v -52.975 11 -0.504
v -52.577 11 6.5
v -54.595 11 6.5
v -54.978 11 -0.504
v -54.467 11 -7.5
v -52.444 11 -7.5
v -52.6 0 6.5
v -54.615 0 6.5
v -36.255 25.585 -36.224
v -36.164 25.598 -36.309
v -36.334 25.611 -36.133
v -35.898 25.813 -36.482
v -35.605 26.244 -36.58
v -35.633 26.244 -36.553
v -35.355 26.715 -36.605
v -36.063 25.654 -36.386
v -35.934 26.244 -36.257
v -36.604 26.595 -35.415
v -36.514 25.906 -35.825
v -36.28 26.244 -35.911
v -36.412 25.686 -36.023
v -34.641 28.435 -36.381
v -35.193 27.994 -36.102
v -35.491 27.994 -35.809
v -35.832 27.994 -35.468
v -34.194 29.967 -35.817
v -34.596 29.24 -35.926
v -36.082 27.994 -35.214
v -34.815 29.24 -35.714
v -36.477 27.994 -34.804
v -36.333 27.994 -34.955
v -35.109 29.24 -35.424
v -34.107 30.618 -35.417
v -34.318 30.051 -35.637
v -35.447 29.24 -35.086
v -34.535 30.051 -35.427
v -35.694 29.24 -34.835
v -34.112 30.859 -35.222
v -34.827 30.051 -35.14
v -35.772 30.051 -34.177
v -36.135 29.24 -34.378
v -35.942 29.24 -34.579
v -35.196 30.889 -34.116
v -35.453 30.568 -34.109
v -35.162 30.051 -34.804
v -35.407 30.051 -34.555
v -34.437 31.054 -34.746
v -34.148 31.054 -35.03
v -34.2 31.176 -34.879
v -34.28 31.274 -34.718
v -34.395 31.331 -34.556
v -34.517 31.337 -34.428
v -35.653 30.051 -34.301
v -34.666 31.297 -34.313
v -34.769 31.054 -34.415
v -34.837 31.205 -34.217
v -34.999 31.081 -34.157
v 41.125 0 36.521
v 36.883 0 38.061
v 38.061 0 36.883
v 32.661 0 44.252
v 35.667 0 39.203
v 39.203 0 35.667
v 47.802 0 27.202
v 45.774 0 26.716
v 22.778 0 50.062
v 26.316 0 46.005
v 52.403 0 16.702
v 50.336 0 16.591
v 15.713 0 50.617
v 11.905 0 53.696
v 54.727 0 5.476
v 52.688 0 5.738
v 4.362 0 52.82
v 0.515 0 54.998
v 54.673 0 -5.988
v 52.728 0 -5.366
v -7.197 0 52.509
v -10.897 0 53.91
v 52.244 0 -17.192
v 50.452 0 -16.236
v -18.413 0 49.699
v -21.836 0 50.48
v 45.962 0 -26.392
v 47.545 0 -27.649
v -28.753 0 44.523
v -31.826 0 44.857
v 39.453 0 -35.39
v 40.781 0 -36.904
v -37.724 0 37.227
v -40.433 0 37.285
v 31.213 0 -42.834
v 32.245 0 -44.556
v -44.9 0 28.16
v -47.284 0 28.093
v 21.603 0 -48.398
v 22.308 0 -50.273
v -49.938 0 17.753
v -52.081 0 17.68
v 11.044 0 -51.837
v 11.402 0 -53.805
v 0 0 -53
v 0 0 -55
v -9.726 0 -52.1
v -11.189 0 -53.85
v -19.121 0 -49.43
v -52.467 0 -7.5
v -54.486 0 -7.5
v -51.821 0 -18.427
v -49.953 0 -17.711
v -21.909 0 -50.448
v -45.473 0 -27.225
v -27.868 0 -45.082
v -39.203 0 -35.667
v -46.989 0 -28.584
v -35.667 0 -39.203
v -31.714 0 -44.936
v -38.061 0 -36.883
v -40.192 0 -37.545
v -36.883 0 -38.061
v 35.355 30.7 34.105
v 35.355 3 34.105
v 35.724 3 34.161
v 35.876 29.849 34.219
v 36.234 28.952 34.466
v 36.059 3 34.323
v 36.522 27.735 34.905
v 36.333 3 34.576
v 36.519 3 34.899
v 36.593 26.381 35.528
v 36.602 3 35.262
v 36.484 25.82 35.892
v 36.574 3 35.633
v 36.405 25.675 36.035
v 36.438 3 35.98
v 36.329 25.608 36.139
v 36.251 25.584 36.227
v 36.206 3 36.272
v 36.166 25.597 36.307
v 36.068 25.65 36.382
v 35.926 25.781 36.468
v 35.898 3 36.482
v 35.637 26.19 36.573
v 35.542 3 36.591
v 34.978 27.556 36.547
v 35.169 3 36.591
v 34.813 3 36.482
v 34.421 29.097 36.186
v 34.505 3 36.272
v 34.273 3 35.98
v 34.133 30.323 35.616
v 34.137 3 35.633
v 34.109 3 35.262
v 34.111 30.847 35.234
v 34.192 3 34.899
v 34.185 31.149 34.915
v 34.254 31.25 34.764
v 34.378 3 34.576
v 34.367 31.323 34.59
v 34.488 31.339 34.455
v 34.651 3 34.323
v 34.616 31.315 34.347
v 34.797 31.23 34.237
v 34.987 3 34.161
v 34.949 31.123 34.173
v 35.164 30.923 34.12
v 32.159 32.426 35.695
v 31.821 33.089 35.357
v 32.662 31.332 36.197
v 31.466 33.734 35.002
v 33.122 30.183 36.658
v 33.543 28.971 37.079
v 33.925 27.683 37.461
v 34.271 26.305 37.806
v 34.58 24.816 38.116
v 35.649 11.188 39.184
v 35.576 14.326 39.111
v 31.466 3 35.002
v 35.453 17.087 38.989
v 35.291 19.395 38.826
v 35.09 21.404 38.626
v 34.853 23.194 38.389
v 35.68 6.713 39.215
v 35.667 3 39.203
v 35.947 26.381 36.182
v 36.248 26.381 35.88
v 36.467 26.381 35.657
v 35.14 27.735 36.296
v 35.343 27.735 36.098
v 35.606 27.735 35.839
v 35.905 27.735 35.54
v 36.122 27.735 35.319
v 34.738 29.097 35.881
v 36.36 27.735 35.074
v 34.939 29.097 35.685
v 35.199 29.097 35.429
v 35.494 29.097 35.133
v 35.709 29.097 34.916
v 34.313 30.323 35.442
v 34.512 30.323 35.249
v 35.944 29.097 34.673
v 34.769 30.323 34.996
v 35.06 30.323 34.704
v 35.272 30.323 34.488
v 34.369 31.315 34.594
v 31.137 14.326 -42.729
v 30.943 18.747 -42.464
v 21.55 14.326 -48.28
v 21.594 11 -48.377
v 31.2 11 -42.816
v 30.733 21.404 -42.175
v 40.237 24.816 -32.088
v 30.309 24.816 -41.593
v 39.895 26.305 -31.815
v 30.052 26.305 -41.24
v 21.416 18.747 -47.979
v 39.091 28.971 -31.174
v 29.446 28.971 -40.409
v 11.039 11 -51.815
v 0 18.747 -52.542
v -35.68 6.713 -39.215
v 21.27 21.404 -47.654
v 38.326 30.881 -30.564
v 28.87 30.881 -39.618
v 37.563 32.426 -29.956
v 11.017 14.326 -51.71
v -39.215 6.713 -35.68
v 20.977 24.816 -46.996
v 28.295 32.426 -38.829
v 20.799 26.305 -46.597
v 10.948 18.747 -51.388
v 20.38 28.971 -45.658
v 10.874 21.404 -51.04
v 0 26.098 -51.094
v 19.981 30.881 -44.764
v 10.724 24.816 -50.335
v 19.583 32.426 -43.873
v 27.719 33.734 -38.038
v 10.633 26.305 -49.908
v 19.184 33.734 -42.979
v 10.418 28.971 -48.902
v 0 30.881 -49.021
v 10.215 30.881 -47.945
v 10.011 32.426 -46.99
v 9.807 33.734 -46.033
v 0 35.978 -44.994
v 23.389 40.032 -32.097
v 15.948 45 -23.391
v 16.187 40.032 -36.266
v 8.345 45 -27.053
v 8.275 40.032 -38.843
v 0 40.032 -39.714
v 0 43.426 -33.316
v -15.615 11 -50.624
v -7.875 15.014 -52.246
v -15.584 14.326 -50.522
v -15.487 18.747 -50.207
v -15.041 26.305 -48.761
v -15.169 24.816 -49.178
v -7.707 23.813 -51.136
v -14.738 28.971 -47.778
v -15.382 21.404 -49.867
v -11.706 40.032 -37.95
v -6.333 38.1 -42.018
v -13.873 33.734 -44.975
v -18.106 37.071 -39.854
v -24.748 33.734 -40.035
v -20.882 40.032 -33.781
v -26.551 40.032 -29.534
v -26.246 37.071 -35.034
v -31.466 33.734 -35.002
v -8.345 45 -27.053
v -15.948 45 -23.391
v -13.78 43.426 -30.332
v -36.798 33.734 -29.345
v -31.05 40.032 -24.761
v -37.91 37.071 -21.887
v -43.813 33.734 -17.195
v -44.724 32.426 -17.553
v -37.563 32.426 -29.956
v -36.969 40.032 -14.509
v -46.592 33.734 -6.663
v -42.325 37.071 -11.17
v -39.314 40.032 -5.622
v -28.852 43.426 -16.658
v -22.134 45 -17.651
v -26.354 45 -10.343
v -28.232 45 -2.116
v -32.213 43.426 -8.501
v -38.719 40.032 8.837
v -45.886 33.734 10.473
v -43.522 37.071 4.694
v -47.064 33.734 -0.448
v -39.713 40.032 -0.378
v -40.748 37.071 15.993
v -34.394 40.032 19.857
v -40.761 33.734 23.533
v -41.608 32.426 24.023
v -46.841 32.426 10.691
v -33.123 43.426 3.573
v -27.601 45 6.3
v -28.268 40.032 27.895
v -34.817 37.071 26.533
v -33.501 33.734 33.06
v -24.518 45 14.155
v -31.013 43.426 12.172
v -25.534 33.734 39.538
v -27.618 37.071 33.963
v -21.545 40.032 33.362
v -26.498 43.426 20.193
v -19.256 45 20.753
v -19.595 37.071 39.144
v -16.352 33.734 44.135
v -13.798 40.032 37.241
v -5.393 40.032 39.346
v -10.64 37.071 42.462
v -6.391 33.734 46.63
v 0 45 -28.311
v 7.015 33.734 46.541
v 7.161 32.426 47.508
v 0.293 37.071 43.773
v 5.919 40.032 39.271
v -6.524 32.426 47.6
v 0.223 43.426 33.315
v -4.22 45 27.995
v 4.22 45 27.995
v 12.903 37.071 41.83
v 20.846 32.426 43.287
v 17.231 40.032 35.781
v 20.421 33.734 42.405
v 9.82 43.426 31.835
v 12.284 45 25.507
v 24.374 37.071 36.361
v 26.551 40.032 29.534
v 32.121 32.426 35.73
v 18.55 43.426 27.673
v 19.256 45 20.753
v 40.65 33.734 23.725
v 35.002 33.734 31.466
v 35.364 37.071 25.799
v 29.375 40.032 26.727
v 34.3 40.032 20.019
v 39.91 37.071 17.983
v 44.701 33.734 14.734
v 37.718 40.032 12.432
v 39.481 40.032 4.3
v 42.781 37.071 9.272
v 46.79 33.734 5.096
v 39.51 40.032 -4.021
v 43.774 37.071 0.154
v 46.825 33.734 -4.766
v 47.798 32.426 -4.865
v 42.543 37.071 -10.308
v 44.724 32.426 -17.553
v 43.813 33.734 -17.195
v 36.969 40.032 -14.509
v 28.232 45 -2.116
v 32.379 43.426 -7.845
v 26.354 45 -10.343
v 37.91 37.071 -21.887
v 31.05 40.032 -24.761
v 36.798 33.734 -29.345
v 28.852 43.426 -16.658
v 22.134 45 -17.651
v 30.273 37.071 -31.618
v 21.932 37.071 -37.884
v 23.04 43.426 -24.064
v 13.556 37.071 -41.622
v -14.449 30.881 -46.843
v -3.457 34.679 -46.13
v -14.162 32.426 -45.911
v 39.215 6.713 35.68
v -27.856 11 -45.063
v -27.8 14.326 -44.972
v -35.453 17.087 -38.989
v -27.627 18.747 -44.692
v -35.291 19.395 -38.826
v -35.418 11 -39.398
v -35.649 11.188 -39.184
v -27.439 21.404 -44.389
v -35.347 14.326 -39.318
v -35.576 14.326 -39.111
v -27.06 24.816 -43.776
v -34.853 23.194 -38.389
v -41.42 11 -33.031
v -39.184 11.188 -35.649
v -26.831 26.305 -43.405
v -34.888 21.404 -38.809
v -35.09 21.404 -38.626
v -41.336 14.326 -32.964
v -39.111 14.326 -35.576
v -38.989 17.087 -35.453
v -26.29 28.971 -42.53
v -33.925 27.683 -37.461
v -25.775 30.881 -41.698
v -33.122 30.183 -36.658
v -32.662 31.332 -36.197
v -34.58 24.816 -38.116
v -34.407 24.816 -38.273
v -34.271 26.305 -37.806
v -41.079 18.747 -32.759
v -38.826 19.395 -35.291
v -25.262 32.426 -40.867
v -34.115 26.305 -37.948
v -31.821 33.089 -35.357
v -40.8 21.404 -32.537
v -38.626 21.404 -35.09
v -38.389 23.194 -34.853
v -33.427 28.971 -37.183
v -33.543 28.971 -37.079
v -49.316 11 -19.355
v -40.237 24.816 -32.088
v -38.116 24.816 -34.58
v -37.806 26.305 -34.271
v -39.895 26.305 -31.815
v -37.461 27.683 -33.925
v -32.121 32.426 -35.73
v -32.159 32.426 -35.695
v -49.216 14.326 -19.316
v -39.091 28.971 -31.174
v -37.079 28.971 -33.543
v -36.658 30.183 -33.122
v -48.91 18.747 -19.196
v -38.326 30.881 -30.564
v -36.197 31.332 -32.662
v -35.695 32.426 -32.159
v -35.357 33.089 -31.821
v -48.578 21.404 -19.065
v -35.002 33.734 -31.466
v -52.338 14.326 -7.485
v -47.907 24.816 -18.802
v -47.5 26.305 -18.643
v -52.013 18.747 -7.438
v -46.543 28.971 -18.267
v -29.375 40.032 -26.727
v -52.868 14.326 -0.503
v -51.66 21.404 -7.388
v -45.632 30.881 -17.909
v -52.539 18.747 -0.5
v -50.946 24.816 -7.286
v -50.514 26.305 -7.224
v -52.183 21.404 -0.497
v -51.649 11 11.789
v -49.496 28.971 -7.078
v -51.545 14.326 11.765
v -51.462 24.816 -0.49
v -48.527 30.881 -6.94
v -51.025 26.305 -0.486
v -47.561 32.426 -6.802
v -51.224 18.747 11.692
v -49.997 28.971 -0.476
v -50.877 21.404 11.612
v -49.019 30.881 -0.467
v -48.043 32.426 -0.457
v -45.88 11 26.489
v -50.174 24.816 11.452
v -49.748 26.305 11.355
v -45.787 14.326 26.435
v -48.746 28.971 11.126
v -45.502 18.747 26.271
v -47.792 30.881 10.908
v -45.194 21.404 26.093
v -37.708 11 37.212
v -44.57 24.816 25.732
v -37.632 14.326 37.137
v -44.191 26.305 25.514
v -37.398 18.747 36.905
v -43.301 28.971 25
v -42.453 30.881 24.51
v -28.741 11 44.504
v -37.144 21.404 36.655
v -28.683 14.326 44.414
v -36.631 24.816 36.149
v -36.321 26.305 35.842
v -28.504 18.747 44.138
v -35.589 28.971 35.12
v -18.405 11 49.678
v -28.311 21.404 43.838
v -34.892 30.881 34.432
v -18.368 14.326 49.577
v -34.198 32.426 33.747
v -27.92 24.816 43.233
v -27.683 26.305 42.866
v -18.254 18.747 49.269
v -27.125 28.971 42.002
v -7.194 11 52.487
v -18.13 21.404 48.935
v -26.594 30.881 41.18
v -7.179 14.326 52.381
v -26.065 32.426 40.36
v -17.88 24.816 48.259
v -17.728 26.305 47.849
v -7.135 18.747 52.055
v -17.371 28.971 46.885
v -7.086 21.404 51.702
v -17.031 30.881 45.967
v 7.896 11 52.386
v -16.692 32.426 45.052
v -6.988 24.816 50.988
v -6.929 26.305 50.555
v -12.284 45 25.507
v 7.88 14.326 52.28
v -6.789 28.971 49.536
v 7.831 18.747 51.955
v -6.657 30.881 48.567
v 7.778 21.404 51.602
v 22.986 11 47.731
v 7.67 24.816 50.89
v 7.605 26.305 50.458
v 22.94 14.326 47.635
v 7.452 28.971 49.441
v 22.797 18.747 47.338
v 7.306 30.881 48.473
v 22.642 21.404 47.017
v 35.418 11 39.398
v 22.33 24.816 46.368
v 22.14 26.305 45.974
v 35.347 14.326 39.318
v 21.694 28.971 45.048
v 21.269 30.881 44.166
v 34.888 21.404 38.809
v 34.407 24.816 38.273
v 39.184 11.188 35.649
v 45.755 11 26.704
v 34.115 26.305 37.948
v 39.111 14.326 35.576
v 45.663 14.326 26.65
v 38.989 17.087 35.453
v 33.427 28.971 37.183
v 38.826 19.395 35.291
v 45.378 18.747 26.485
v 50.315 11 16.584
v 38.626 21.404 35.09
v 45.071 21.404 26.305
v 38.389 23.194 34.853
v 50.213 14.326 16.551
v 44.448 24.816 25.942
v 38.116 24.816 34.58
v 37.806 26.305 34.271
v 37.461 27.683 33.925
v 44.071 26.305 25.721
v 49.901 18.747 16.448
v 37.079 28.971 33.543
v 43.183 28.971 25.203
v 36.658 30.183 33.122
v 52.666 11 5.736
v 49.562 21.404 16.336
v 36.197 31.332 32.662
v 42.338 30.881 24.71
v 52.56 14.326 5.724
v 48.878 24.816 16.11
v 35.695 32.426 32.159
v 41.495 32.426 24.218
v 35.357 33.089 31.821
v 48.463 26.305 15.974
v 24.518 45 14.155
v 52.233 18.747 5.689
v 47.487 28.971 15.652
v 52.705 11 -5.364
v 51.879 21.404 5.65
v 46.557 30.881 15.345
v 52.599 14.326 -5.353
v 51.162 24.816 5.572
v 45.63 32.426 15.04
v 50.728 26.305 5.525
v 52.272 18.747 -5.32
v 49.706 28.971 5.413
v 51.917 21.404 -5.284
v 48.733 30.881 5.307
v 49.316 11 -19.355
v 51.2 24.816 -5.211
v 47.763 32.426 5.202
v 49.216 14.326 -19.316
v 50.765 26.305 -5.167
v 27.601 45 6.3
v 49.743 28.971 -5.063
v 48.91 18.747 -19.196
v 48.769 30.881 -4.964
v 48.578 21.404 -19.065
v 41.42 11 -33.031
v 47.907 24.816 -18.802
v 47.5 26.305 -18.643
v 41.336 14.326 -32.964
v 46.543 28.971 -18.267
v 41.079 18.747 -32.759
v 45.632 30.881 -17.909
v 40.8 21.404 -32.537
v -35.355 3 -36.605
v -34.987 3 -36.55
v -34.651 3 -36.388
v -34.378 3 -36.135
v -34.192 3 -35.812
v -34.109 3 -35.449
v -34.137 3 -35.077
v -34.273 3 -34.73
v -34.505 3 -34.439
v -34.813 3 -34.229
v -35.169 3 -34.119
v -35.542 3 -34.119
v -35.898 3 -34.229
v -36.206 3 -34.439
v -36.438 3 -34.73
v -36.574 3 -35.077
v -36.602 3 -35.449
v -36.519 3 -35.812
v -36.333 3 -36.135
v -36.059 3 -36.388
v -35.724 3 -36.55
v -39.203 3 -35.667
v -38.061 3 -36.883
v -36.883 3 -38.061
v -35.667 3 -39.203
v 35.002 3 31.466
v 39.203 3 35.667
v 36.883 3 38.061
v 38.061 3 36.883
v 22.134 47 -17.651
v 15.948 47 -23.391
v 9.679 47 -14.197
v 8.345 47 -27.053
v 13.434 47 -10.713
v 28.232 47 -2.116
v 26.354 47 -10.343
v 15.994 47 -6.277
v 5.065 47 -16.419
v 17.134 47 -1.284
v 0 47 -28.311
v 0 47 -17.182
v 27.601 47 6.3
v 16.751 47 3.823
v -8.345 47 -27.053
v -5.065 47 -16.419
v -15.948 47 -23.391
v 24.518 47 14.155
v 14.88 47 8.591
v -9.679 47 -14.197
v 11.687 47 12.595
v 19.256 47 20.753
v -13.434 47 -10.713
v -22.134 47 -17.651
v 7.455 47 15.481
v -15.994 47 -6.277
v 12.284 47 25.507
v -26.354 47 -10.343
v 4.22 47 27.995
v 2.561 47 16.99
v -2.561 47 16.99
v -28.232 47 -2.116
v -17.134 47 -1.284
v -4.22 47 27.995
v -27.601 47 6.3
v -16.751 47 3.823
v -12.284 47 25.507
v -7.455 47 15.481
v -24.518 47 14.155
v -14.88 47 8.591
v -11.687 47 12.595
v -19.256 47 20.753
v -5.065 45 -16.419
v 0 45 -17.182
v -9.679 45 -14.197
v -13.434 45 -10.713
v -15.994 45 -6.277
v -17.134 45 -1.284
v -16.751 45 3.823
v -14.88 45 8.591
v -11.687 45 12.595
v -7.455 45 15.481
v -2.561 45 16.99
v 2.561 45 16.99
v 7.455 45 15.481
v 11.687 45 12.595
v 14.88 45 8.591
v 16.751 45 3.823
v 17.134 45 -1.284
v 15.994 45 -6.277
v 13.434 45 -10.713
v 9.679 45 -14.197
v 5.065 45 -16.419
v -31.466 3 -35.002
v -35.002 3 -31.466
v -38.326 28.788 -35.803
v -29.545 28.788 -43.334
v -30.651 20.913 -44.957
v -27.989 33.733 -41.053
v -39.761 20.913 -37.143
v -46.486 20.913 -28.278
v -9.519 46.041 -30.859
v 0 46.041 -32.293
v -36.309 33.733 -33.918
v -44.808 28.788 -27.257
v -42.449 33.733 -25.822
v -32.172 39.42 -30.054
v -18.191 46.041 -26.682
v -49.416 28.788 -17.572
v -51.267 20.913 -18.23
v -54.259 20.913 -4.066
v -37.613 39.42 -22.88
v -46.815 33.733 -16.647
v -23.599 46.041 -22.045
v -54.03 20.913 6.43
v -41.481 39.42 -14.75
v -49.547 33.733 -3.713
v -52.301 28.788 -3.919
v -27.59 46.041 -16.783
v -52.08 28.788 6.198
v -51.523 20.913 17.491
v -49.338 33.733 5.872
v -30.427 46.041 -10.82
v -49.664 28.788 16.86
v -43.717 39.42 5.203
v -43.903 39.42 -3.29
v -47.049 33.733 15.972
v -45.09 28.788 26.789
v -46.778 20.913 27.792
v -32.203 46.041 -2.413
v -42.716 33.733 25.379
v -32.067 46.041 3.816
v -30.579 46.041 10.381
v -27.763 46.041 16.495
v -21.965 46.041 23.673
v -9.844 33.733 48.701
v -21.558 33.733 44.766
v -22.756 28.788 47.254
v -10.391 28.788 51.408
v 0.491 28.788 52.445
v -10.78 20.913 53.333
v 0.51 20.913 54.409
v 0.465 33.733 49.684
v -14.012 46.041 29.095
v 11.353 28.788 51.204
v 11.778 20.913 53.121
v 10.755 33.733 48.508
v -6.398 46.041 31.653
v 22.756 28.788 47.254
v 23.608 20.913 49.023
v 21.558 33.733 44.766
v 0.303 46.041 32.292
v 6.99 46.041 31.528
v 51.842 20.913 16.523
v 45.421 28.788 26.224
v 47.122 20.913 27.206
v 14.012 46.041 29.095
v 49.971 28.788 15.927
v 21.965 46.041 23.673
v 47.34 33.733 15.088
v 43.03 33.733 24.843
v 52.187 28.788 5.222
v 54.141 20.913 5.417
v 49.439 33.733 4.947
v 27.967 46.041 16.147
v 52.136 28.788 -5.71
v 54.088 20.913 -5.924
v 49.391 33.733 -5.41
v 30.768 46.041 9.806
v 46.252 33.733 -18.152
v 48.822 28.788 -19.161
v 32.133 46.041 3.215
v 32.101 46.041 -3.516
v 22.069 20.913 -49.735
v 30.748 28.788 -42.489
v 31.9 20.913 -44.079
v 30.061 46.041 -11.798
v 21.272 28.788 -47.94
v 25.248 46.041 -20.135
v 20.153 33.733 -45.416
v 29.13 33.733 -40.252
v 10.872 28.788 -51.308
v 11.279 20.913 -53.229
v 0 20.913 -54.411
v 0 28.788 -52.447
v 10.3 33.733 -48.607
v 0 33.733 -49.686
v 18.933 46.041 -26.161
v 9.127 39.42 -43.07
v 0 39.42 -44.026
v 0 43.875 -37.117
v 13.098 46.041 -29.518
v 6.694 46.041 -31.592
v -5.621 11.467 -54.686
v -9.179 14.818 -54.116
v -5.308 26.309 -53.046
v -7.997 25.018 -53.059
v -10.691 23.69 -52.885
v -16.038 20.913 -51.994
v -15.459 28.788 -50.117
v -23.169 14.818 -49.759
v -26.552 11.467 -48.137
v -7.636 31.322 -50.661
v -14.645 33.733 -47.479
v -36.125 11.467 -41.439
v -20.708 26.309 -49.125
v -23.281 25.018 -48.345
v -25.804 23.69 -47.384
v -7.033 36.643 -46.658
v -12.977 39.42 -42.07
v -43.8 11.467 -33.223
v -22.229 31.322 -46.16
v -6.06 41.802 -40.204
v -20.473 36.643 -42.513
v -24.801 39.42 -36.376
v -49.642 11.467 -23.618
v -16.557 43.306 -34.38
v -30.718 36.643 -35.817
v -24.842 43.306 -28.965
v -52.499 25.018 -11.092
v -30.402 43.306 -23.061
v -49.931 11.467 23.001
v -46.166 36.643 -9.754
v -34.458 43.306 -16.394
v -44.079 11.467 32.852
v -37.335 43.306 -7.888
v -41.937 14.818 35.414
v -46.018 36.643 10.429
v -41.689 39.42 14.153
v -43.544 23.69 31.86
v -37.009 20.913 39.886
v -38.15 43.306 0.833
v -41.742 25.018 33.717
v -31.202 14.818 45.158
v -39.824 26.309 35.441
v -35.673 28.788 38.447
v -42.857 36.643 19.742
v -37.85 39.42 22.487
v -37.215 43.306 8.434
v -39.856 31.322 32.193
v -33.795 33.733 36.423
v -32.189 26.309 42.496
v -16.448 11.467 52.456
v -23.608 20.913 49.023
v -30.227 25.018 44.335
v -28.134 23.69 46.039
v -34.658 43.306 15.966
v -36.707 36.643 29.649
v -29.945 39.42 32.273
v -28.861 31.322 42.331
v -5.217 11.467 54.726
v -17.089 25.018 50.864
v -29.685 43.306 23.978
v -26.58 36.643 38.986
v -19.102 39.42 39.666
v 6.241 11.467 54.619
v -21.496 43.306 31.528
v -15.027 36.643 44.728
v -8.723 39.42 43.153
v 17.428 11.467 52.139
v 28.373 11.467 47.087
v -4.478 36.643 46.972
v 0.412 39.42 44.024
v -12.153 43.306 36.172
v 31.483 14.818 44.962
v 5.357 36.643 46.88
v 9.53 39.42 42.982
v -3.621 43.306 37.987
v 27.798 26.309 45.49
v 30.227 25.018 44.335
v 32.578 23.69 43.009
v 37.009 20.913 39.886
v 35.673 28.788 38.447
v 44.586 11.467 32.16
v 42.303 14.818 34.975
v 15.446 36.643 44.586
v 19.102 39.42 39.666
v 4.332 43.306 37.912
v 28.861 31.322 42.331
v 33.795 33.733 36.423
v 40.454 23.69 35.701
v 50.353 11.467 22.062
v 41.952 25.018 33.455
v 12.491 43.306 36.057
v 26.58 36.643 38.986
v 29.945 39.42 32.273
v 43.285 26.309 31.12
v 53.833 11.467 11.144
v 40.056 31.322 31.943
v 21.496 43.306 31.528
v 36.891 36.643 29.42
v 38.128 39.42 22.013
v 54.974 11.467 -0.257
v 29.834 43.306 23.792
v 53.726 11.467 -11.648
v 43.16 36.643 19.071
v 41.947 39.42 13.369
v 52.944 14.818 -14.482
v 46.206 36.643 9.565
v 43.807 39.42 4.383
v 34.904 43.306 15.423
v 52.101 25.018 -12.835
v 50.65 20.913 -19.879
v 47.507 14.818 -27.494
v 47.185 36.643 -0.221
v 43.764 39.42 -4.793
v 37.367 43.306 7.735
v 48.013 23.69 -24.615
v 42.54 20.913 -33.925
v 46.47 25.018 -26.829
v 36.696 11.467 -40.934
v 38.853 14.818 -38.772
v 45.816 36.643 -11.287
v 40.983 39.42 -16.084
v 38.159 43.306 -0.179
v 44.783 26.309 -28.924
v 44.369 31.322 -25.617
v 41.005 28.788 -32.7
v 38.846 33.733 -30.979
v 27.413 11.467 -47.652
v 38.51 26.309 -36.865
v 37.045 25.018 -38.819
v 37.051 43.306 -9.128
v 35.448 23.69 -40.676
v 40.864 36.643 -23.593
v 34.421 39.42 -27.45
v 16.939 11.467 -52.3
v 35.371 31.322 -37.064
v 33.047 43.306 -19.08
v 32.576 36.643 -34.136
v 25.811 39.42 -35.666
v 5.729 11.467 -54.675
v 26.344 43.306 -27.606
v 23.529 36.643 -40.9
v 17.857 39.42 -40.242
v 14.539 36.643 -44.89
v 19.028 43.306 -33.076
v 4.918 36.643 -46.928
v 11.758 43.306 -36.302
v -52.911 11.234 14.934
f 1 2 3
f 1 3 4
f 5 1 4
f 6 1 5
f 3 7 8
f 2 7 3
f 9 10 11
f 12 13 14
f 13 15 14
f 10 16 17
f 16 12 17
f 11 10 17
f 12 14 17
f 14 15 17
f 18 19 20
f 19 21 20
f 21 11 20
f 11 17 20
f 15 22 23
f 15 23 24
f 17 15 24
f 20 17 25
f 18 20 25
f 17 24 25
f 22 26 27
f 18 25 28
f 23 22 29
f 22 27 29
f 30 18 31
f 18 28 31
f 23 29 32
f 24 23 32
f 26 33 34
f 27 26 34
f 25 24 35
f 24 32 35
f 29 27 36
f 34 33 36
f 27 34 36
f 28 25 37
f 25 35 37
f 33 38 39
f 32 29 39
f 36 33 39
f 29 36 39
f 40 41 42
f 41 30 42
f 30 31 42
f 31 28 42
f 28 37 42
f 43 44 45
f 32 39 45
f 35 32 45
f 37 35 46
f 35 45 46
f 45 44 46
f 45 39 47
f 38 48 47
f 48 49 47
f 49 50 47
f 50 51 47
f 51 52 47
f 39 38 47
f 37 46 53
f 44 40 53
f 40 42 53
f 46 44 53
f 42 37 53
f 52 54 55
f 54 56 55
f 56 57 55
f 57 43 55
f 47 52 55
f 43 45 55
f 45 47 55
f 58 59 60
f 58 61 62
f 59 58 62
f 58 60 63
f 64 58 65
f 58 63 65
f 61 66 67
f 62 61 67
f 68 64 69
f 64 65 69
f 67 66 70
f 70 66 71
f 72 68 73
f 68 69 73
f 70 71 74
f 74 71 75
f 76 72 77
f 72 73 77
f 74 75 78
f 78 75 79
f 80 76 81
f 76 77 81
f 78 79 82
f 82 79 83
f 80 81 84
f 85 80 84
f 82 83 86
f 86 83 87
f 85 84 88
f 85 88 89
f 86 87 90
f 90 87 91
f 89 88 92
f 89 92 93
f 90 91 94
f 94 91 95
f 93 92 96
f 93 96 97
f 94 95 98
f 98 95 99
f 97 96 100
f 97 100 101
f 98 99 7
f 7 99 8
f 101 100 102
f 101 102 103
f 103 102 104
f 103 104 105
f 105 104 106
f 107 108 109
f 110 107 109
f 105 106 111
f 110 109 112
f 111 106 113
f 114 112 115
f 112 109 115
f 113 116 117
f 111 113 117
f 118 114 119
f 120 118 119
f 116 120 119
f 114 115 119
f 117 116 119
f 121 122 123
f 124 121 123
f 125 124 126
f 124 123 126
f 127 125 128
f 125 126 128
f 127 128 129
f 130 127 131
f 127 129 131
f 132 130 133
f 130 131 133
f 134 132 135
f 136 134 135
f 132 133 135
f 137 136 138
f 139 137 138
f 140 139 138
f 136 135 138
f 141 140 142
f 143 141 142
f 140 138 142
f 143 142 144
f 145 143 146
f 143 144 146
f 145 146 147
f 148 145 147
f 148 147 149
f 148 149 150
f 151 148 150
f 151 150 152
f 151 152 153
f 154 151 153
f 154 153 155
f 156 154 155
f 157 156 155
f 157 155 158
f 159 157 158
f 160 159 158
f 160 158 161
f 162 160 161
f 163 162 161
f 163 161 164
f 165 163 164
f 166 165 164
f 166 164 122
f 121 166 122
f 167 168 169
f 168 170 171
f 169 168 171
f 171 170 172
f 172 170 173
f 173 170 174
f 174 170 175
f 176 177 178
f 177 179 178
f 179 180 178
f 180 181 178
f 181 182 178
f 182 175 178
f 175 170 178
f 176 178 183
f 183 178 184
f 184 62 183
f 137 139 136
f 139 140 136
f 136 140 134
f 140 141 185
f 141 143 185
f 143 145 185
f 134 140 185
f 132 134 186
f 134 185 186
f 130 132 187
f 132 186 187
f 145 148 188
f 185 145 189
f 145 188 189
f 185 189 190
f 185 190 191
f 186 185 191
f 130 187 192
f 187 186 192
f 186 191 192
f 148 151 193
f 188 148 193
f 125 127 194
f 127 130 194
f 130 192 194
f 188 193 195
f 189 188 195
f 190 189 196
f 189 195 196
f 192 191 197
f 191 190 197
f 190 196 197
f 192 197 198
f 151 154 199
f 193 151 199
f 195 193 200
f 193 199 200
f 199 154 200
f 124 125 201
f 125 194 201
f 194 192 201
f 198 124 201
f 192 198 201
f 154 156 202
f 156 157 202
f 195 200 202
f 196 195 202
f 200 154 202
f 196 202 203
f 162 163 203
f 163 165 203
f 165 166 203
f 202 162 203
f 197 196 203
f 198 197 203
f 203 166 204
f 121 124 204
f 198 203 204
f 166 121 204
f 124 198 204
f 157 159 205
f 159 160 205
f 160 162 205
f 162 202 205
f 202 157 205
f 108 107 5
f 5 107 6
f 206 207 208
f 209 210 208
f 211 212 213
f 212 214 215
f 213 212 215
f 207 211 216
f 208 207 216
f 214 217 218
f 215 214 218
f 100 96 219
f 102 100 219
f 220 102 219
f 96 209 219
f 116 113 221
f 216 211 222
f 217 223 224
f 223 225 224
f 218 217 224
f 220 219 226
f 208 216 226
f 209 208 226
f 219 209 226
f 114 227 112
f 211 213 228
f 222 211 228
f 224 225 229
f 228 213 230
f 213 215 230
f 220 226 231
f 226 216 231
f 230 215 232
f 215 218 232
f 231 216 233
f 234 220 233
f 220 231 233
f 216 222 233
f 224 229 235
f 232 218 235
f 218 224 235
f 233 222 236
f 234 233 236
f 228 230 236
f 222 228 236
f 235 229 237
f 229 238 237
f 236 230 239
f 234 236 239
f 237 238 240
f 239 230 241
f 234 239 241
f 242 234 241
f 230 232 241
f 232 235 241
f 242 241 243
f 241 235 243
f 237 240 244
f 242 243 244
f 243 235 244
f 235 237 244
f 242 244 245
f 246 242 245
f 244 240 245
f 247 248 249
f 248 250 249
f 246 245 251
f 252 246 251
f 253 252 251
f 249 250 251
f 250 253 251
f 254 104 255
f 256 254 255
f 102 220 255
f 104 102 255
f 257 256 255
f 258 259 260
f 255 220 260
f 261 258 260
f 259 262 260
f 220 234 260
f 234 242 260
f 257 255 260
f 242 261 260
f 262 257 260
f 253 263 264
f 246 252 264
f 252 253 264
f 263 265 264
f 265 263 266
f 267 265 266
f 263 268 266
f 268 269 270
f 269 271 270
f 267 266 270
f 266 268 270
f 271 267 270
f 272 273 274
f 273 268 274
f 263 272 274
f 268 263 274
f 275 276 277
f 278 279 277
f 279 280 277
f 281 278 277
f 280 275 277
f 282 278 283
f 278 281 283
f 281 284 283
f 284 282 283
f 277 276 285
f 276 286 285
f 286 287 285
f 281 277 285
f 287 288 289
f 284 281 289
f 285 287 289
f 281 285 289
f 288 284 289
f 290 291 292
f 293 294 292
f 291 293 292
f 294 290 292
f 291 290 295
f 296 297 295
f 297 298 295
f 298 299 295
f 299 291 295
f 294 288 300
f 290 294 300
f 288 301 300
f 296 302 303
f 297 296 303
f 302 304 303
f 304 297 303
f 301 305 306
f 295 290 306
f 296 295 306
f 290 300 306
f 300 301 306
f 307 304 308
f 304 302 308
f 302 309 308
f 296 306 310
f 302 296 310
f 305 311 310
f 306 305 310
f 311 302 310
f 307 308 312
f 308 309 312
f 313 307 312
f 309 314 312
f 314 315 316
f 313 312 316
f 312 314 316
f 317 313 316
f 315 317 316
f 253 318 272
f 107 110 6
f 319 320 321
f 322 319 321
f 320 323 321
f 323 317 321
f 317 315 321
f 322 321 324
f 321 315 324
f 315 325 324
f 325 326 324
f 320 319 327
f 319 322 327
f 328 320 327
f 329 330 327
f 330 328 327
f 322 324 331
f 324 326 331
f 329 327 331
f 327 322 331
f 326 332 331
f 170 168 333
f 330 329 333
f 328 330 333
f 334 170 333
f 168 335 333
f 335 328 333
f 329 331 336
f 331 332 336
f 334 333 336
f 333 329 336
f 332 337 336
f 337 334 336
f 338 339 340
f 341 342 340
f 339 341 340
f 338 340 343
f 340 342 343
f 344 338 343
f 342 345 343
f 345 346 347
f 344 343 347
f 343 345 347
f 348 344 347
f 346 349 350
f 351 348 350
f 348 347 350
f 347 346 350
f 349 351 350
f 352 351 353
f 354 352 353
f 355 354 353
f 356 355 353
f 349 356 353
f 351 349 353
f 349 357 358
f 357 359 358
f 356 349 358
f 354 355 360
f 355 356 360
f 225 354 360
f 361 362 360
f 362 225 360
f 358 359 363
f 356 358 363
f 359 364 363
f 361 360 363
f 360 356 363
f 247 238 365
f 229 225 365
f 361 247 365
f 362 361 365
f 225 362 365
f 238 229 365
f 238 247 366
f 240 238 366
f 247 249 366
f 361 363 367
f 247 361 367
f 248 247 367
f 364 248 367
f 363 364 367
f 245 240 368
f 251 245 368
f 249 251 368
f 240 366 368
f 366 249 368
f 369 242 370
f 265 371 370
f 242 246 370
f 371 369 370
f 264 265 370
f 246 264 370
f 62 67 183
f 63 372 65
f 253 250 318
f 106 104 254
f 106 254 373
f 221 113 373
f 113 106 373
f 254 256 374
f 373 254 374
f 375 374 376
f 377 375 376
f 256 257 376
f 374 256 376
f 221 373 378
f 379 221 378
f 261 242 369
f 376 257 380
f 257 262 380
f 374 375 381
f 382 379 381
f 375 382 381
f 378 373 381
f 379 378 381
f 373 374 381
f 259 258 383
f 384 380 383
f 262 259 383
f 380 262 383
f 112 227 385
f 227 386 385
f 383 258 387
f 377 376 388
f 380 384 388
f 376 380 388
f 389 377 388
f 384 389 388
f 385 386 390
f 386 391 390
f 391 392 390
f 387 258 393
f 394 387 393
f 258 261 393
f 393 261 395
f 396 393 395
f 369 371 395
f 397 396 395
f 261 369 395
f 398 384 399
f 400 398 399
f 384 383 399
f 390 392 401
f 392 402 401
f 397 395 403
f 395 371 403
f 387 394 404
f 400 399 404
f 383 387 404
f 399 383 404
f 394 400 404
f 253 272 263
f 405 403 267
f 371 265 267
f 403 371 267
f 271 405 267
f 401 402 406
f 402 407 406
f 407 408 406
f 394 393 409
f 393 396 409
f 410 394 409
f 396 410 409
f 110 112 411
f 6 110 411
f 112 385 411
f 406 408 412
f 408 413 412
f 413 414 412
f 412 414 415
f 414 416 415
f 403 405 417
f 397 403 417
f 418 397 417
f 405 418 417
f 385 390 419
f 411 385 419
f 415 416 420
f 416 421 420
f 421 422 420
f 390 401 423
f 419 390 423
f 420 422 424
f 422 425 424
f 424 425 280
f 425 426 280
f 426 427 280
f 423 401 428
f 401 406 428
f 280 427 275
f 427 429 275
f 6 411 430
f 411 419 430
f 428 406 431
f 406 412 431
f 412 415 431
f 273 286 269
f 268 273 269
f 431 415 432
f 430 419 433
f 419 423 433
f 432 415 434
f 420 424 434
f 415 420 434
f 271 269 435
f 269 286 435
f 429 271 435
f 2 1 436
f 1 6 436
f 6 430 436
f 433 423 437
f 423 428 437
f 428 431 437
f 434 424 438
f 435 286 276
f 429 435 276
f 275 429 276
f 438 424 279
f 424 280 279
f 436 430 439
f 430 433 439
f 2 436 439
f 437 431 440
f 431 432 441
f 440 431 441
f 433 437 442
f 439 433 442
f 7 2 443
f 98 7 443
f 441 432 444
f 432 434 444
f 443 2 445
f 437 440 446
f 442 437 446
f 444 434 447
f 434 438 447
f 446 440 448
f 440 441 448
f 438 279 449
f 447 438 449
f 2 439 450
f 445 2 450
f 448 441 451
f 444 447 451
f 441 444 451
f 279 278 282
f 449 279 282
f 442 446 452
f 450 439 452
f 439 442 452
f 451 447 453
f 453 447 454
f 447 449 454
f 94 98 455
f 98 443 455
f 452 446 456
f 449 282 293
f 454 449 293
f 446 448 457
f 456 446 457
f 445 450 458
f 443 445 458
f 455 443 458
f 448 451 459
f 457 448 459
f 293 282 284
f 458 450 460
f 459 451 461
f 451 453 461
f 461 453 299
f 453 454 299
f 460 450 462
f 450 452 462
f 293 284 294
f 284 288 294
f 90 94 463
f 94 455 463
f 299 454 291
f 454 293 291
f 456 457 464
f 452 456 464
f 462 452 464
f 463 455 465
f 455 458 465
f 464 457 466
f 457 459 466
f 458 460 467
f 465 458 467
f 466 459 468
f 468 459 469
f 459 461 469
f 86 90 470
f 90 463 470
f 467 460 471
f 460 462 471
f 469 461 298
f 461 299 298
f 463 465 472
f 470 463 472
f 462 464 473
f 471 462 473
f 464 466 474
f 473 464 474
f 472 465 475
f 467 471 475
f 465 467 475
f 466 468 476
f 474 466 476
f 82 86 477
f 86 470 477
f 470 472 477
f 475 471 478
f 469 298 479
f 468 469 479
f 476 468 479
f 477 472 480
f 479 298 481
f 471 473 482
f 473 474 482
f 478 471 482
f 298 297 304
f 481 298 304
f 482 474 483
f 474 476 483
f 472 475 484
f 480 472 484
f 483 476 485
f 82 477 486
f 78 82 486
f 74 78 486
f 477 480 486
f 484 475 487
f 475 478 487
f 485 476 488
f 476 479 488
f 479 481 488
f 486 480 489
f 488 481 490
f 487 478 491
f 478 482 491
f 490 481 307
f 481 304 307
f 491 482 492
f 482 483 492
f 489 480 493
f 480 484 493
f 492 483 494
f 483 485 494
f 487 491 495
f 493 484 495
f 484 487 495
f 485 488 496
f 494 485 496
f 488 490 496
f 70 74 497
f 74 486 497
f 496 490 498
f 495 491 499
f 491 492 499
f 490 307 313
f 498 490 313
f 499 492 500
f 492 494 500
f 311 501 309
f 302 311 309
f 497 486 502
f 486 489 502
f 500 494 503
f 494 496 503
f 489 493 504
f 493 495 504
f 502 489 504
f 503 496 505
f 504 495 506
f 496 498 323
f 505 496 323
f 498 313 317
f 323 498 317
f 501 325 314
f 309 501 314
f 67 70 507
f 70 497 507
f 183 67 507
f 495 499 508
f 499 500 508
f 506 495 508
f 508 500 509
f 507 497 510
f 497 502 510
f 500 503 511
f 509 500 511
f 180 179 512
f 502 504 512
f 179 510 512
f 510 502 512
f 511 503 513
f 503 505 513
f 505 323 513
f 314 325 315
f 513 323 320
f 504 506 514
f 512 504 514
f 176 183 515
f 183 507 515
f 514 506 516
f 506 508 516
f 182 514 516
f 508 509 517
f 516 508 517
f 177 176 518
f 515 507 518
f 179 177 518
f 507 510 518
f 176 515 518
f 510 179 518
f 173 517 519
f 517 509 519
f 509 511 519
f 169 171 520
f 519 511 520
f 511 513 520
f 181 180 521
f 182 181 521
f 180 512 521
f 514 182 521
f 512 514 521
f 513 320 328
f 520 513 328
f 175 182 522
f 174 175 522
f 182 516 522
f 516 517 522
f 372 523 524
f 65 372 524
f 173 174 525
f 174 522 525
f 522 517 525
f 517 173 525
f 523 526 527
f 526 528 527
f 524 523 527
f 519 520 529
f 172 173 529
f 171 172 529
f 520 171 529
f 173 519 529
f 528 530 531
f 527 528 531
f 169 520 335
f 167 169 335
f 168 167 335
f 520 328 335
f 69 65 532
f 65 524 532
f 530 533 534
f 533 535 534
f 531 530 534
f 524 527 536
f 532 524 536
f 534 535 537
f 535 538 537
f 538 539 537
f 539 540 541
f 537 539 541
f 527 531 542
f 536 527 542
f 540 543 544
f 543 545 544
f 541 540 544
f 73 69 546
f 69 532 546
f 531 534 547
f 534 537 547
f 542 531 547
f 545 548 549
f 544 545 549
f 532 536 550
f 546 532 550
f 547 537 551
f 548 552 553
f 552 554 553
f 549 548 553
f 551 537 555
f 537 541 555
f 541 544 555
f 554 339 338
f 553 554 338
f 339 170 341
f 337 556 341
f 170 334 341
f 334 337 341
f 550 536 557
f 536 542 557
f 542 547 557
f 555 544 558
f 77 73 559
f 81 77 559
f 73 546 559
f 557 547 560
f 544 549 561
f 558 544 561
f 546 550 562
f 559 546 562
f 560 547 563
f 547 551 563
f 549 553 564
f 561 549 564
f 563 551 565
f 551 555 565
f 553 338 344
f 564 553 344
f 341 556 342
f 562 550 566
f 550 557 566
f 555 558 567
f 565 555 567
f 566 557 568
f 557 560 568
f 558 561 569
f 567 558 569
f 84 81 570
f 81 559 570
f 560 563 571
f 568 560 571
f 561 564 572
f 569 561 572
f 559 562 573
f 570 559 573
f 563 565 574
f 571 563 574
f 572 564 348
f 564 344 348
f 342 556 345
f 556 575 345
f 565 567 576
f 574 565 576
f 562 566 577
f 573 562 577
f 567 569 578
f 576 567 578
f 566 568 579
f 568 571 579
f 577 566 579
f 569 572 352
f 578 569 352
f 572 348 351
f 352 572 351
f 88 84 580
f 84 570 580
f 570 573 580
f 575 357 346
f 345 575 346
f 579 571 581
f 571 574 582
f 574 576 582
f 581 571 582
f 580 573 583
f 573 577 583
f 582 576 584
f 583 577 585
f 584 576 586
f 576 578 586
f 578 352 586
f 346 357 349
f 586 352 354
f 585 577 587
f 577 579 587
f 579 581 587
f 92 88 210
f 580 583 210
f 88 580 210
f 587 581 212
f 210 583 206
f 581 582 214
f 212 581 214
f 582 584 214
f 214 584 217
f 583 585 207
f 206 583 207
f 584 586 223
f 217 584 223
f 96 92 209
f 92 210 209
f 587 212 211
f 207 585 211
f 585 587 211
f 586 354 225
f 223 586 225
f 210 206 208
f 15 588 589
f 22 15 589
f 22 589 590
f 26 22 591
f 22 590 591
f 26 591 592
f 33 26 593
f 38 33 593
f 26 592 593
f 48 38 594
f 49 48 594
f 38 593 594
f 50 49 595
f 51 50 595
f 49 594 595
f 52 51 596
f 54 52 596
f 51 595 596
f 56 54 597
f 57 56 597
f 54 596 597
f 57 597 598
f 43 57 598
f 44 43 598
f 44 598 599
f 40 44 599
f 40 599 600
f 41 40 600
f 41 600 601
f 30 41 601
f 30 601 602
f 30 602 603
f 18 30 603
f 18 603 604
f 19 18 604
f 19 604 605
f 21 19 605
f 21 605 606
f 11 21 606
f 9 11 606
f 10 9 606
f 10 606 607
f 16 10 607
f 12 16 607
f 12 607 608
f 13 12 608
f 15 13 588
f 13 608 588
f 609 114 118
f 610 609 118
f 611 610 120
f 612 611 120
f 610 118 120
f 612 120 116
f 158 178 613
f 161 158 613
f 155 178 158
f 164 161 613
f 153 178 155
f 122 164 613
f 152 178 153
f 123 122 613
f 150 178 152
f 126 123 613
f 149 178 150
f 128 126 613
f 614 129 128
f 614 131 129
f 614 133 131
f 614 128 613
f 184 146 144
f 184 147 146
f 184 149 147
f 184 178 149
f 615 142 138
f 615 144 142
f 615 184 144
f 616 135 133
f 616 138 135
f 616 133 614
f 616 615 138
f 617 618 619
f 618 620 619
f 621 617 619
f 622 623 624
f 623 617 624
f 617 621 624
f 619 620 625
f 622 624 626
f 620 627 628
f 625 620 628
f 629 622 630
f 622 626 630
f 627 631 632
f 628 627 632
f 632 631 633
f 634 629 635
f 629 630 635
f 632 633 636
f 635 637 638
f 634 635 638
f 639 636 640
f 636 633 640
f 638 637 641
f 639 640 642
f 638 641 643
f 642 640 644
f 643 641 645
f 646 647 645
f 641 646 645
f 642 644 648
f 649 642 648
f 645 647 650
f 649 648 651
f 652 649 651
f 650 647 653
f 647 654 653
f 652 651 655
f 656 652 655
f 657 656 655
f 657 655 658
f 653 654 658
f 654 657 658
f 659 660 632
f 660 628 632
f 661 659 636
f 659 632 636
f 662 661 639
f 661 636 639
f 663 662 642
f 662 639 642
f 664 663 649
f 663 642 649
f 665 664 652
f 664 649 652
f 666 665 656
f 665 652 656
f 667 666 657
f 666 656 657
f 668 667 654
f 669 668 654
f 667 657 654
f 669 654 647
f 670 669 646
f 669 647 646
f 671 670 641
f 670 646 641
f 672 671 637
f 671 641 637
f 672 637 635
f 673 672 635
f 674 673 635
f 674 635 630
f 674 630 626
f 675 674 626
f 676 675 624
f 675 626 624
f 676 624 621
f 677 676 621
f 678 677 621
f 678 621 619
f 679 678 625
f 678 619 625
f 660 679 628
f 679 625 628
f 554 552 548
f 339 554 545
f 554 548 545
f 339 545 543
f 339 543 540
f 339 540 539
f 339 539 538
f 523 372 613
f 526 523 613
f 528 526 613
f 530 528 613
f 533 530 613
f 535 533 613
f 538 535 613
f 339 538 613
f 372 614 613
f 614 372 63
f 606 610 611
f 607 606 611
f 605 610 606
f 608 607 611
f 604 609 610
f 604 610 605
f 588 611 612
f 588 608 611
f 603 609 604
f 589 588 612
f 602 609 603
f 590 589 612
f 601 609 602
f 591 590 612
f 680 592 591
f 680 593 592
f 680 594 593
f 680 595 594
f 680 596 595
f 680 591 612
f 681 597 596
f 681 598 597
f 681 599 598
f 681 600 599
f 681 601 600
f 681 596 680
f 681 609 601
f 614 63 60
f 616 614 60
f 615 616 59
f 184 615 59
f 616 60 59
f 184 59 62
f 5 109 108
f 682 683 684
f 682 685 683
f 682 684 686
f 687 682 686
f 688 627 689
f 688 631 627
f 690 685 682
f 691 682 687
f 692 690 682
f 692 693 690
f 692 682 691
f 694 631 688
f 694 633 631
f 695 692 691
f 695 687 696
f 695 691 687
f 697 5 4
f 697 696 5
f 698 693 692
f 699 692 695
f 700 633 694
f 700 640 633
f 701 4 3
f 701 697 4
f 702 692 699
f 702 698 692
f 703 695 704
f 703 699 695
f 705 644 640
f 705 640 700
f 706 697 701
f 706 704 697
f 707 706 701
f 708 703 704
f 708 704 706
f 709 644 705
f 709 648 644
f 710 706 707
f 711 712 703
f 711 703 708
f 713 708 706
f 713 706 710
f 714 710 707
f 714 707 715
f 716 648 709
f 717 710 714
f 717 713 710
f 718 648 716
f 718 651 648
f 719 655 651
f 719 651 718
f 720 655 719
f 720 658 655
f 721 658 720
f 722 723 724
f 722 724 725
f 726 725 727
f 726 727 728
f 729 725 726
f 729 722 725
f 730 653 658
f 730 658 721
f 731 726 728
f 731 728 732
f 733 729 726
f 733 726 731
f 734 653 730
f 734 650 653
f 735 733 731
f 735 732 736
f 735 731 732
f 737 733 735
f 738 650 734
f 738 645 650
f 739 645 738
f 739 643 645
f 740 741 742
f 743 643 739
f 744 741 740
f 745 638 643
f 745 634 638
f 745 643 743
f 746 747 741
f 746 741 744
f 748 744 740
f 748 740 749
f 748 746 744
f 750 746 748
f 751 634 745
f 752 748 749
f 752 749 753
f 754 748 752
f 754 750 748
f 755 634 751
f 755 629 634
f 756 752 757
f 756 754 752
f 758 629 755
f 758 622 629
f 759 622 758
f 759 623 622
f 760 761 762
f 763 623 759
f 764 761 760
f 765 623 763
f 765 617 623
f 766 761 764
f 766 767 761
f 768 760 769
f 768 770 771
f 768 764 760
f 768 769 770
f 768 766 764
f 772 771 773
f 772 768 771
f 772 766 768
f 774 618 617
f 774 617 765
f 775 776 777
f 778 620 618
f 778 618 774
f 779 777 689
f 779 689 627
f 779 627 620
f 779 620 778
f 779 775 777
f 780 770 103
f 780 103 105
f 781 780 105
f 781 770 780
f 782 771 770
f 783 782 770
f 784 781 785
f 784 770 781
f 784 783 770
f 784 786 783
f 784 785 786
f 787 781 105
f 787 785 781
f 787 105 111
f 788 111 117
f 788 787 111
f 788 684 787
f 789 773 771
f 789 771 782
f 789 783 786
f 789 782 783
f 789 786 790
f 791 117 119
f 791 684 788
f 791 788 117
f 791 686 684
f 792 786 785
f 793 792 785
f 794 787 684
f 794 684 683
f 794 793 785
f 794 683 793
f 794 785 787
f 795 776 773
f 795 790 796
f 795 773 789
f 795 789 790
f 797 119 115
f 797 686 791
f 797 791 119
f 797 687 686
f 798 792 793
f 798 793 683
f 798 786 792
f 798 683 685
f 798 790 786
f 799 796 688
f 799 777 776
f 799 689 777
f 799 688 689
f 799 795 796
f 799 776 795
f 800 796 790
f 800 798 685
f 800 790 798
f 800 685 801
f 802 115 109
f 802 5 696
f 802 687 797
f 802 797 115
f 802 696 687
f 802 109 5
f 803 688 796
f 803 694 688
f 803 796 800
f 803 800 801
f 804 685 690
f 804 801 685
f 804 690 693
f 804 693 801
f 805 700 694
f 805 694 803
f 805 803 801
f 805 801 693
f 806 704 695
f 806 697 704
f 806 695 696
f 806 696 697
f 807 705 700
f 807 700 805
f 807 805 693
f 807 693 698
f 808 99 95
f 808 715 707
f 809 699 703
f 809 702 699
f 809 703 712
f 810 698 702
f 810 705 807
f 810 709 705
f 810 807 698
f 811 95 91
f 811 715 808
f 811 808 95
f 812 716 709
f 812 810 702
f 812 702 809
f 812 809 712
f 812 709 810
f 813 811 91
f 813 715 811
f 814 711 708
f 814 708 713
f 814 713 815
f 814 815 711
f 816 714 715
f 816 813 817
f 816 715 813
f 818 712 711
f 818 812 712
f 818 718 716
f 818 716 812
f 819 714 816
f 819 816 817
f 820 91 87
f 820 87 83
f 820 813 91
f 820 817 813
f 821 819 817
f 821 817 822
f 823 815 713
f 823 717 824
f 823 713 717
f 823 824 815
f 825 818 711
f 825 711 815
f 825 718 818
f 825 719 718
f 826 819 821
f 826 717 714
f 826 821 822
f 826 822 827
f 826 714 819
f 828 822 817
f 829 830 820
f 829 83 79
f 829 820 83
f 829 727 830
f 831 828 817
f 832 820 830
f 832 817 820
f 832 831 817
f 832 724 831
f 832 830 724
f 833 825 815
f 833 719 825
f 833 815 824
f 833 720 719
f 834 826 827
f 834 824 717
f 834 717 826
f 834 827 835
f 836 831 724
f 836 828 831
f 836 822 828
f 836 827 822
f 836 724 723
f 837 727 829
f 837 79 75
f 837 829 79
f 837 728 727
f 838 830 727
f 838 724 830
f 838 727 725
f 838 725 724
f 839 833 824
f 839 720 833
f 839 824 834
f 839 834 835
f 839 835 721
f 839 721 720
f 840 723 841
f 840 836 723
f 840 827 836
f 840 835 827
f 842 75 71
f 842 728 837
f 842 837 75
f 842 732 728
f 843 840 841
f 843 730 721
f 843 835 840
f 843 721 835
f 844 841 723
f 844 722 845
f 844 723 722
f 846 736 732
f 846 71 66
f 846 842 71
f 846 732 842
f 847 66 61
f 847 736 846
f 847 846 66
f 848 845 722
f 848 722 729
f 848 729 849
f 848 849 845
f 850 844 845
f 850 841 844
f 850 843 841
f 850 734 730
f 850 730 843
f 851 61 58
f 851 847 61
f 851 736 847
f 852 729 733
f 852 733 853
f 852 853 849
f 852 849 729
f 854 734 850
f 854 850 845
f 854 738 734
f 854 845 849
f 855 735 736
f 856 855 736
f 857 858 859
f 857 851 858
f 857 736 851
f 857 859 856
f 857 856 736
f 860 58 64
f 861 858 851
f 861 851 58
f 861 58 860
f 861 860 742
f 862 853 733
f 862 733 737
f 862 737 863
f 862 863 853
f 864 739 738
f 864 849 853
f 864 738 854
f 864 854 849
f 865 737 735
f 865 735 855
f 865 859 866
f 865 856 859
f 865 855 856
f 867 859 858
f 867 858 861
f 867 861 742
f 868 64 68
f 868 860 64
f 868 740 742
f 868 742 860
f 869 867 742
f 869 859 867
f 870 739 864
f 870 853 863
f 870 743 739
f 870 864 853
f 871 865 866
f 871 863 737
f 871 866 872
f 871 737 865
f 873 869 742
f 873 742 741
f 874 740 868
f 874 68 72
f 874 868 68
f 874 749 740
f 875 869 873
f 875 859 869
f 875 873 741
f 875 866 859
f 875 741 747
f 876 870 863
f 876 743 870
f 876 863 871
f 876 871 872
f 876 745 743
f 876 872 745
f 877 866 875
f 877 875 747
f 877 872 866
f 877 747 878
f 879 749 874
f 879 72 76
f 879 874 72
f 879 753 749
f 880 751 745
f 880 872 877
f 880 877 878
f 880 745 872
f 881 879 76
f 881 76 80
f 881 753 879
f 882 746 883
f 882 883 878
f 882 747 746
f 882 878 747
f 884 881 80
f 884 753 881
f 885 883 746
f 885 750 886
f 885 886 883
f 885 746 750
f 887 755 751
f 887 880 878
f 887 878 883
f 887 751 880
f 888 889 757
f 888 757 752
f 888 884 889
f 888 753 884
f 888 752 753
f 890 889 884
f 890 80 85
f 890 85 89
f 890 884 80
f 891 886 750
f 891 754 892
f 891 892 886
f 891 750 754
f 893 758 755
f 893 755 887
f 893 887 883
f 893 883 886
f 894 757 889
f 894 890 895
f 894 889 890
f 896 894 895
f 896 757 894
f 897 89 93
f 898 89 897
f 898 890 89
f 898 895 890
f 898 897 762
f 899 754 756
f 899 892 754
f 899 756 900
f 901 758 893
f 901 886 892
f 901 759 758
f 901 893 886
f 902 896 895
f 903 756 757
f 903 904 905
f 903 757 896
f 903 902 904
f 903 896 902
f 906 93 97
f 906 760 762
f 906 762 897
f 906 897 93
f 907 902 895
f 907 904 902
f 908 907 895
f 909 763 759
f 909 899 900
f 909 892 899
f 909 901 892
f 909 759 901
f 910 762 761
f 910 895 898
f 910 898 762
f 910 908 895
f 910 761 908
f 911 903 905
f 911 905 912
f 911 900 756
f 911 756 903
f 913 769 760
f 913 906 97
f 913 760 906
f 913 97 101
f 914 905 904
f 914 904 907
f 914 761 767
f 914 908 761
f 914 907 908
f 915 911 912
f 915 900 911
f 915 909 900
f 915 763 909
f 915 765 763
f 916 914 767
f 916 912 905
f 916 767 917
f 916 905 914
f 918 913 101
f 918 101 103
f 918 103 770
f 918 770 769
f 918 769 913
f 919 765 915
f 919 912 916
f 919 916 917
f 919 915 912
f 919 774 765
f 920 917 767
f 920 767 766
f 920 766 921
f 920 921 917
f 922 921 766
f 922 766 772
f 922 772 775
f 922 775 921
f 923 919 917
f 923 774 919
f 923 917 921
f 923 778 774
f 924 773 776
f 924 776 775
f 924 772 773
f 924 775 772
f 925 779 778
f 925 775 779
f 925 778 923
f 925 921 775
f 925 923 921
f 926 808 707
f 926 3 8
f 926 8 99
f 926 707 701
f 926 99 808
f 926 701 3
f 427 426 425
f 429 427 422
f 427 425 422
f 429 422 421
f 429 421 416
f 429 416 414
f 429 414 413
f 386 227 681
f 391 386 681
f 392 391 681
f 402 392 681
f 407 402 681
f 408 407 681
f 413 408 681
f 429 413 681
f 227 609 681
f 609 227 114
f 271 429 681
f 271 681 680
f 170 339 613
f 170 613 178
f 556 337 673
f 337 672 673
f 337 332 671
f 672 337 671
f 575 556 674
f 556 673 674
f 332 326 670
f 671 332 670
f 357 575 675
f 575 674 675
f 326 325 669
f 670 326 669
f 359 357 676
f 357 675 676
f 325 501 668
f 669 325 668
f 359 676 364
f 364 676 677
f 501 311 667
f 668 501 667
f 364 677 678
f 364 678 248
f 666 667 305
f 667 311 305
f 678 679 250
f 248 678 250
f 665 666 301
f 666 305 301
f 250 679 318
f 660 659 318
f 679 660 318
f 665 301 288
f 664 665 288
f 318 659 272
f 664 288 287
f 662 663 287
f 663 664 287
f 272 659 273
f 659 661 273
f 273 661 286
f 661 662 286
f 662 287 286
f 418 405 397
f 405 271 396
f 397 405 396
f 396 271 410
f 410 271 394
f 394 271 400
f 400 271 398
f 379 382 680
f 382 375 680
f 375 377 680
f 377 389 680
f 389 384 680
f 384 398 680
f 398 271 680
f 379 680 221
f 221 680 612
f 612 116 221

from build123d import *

# Parameters (mm, degrees)
AUFSATZ_LINEAR_AUSTRAGEN3_REACH = 92.88
SKIZZE2_R                       = 1.25
SKIZZE3_R                       = 53
SCHNITT_LINEAR_AUSTRAGEN1_DEPTH = 3
SCHNITT_LINEAR_AUSTRAGEN2_REACH = 92.88
SKIZZE4_W                       = 14
SKIZZE4_H                       = 11


with BuildPart() as part:
    # Skizze1 → Rotation1 (revolve)
    with BuildSketch(Plane.XY, mode=Mode.PRIVATE) as rotation1_sk:
        with BuildLine():
            Line((55, 0), (53, 0))
            add(Edge.make_bspline(
                [(53, 0), (53.048273889, 17.0063194), (53.749722024, 34.340834234), (31.815546139, 44.555146008), (28.310782841, 45)],
                knots=[0, 0, 0, 0, 0.631184982, 1, 1, 1, 1], degree=3))
            Line((28.310782841, 45), (17.182197797, 45))
            Line((17.182197797, 45), (17.182197797, 47))
            Line((17.182197797, 47), (28.310782841, 47))
            add(Edge.make_bspline(
                [(55, 0), (54.936392328, 18.162630291), (56.396449466, 34.368648063), (32.689382739, 46.685149183), (28.310782841, 47)],
                knots=[0, 0, 0, 0, 0.647187366, 1, 1, 1, 1], degree=3))
        make_face()
    revolve(rotation1_sk.sketch.rotate(Axis((0, -12.15098687, 0), (0, 1, 0)), 90), axis=Axis((0, -12.15098687, 0), (0, 1, 0)))

    # Skizze2 → Aufsatz-Linear austragen3 (add, up to next)
    with BuildSketch(Plane.XZ, mode=Mode.PRIVATE) as aufsatz_linear_austragen3_sk1:
        Polygon((31.466251763, 35.001785669), (36.213171094, 39.748705), (39.748705, 36.213171094), (35.001785669, 31.466251763), align=None)
        with Locations(Location((35.355339059, 35.355339059, 0), (0, 0, 270))):
            Circle(SKIZZE2_R, mode=Mode.SUBTRACT)
    aufsatz_linear_austragen3_tool1 = extrude(aufsatz_linear_austragen3_sk1.sketch, amount=-AUFSATZ_LINEAR_AUSTRAGEN3_REACH, mode=Mode.PRIVATE) - part.part
    # Skizze2 → Aufsatz-Linear austragen3 (add, up to next)
    with BuildSketch(Plane.XZ, mode=Mode.PRIVATE) as aufsatz_linear_austragen3_sk2:
        Polygon((-31.466251763, -35.001785669), (-36.213171094, -39.748705), (-39.748705, -36.213171094), (-35.001785669, -31.466251763), align=None)
        with Locations(Location((-35.355339059, -35.355339059, 0), (0, 0, 270))):
            Circle(SKIZZE2_R, mode=Mode.SUBTRACT)
    aufsatz_linear_austragen3_tool2 = extrude(aufsatz_linear_austragen3_sk2.sketch, amount=-AUFSATZ_LINEAR_AUSTRAGEN3_REACH, mode=Mode.PRIVATE) - part.part
    add(aufsatz_linear_austragen3_tool1.solids().sort_by_distance((33.922536, 0, 37.292421))[0])
    add(aufsatz_linear_austragen3_tool2.solids().sort_by_distance((-33.922536, 0, -37.292421))[0])

    # Skizze3 → Schnitt-Linear austragen1 (cut)
    with BuildSketch(Plane.XZ):
        Circle(SKIZZE3_R)
    extrude(amount=-SCHNITT_LINEAR_AUSTRAGEN1_DEPTH, mode=Mode.SUBTRACT)

    # Skizze4 → Schnitt-Linear austragen2 (cut, up to next)
    with BuildSketch(Plane(origin=(0, 0, 0), x_dir=(0, 0, -1), z_dir=(1, 0, 0)), mode=Mode.PRIVATE) as schnitt_linear_austragen2_sk1:
        with Locations((0.5, 5.5)):
            Rectangle(SKIZZE4_W, SKIZZE4_H)
    schnitt_linear_austragen2_tool1 = extrude(schnitt_linear_austragen2_sk1.sketch, amount=-SCHNITT_LINEAR_AUSTRAGEN2_REACH, mode=Mode.PRIVATE) & part.part
    add(schnitt_linear_austragen2_tool1.solids().sort_by_distance((0, 5.5, -0.5))[0], mode=Mode.SUBTRACT)


solid = part.part
